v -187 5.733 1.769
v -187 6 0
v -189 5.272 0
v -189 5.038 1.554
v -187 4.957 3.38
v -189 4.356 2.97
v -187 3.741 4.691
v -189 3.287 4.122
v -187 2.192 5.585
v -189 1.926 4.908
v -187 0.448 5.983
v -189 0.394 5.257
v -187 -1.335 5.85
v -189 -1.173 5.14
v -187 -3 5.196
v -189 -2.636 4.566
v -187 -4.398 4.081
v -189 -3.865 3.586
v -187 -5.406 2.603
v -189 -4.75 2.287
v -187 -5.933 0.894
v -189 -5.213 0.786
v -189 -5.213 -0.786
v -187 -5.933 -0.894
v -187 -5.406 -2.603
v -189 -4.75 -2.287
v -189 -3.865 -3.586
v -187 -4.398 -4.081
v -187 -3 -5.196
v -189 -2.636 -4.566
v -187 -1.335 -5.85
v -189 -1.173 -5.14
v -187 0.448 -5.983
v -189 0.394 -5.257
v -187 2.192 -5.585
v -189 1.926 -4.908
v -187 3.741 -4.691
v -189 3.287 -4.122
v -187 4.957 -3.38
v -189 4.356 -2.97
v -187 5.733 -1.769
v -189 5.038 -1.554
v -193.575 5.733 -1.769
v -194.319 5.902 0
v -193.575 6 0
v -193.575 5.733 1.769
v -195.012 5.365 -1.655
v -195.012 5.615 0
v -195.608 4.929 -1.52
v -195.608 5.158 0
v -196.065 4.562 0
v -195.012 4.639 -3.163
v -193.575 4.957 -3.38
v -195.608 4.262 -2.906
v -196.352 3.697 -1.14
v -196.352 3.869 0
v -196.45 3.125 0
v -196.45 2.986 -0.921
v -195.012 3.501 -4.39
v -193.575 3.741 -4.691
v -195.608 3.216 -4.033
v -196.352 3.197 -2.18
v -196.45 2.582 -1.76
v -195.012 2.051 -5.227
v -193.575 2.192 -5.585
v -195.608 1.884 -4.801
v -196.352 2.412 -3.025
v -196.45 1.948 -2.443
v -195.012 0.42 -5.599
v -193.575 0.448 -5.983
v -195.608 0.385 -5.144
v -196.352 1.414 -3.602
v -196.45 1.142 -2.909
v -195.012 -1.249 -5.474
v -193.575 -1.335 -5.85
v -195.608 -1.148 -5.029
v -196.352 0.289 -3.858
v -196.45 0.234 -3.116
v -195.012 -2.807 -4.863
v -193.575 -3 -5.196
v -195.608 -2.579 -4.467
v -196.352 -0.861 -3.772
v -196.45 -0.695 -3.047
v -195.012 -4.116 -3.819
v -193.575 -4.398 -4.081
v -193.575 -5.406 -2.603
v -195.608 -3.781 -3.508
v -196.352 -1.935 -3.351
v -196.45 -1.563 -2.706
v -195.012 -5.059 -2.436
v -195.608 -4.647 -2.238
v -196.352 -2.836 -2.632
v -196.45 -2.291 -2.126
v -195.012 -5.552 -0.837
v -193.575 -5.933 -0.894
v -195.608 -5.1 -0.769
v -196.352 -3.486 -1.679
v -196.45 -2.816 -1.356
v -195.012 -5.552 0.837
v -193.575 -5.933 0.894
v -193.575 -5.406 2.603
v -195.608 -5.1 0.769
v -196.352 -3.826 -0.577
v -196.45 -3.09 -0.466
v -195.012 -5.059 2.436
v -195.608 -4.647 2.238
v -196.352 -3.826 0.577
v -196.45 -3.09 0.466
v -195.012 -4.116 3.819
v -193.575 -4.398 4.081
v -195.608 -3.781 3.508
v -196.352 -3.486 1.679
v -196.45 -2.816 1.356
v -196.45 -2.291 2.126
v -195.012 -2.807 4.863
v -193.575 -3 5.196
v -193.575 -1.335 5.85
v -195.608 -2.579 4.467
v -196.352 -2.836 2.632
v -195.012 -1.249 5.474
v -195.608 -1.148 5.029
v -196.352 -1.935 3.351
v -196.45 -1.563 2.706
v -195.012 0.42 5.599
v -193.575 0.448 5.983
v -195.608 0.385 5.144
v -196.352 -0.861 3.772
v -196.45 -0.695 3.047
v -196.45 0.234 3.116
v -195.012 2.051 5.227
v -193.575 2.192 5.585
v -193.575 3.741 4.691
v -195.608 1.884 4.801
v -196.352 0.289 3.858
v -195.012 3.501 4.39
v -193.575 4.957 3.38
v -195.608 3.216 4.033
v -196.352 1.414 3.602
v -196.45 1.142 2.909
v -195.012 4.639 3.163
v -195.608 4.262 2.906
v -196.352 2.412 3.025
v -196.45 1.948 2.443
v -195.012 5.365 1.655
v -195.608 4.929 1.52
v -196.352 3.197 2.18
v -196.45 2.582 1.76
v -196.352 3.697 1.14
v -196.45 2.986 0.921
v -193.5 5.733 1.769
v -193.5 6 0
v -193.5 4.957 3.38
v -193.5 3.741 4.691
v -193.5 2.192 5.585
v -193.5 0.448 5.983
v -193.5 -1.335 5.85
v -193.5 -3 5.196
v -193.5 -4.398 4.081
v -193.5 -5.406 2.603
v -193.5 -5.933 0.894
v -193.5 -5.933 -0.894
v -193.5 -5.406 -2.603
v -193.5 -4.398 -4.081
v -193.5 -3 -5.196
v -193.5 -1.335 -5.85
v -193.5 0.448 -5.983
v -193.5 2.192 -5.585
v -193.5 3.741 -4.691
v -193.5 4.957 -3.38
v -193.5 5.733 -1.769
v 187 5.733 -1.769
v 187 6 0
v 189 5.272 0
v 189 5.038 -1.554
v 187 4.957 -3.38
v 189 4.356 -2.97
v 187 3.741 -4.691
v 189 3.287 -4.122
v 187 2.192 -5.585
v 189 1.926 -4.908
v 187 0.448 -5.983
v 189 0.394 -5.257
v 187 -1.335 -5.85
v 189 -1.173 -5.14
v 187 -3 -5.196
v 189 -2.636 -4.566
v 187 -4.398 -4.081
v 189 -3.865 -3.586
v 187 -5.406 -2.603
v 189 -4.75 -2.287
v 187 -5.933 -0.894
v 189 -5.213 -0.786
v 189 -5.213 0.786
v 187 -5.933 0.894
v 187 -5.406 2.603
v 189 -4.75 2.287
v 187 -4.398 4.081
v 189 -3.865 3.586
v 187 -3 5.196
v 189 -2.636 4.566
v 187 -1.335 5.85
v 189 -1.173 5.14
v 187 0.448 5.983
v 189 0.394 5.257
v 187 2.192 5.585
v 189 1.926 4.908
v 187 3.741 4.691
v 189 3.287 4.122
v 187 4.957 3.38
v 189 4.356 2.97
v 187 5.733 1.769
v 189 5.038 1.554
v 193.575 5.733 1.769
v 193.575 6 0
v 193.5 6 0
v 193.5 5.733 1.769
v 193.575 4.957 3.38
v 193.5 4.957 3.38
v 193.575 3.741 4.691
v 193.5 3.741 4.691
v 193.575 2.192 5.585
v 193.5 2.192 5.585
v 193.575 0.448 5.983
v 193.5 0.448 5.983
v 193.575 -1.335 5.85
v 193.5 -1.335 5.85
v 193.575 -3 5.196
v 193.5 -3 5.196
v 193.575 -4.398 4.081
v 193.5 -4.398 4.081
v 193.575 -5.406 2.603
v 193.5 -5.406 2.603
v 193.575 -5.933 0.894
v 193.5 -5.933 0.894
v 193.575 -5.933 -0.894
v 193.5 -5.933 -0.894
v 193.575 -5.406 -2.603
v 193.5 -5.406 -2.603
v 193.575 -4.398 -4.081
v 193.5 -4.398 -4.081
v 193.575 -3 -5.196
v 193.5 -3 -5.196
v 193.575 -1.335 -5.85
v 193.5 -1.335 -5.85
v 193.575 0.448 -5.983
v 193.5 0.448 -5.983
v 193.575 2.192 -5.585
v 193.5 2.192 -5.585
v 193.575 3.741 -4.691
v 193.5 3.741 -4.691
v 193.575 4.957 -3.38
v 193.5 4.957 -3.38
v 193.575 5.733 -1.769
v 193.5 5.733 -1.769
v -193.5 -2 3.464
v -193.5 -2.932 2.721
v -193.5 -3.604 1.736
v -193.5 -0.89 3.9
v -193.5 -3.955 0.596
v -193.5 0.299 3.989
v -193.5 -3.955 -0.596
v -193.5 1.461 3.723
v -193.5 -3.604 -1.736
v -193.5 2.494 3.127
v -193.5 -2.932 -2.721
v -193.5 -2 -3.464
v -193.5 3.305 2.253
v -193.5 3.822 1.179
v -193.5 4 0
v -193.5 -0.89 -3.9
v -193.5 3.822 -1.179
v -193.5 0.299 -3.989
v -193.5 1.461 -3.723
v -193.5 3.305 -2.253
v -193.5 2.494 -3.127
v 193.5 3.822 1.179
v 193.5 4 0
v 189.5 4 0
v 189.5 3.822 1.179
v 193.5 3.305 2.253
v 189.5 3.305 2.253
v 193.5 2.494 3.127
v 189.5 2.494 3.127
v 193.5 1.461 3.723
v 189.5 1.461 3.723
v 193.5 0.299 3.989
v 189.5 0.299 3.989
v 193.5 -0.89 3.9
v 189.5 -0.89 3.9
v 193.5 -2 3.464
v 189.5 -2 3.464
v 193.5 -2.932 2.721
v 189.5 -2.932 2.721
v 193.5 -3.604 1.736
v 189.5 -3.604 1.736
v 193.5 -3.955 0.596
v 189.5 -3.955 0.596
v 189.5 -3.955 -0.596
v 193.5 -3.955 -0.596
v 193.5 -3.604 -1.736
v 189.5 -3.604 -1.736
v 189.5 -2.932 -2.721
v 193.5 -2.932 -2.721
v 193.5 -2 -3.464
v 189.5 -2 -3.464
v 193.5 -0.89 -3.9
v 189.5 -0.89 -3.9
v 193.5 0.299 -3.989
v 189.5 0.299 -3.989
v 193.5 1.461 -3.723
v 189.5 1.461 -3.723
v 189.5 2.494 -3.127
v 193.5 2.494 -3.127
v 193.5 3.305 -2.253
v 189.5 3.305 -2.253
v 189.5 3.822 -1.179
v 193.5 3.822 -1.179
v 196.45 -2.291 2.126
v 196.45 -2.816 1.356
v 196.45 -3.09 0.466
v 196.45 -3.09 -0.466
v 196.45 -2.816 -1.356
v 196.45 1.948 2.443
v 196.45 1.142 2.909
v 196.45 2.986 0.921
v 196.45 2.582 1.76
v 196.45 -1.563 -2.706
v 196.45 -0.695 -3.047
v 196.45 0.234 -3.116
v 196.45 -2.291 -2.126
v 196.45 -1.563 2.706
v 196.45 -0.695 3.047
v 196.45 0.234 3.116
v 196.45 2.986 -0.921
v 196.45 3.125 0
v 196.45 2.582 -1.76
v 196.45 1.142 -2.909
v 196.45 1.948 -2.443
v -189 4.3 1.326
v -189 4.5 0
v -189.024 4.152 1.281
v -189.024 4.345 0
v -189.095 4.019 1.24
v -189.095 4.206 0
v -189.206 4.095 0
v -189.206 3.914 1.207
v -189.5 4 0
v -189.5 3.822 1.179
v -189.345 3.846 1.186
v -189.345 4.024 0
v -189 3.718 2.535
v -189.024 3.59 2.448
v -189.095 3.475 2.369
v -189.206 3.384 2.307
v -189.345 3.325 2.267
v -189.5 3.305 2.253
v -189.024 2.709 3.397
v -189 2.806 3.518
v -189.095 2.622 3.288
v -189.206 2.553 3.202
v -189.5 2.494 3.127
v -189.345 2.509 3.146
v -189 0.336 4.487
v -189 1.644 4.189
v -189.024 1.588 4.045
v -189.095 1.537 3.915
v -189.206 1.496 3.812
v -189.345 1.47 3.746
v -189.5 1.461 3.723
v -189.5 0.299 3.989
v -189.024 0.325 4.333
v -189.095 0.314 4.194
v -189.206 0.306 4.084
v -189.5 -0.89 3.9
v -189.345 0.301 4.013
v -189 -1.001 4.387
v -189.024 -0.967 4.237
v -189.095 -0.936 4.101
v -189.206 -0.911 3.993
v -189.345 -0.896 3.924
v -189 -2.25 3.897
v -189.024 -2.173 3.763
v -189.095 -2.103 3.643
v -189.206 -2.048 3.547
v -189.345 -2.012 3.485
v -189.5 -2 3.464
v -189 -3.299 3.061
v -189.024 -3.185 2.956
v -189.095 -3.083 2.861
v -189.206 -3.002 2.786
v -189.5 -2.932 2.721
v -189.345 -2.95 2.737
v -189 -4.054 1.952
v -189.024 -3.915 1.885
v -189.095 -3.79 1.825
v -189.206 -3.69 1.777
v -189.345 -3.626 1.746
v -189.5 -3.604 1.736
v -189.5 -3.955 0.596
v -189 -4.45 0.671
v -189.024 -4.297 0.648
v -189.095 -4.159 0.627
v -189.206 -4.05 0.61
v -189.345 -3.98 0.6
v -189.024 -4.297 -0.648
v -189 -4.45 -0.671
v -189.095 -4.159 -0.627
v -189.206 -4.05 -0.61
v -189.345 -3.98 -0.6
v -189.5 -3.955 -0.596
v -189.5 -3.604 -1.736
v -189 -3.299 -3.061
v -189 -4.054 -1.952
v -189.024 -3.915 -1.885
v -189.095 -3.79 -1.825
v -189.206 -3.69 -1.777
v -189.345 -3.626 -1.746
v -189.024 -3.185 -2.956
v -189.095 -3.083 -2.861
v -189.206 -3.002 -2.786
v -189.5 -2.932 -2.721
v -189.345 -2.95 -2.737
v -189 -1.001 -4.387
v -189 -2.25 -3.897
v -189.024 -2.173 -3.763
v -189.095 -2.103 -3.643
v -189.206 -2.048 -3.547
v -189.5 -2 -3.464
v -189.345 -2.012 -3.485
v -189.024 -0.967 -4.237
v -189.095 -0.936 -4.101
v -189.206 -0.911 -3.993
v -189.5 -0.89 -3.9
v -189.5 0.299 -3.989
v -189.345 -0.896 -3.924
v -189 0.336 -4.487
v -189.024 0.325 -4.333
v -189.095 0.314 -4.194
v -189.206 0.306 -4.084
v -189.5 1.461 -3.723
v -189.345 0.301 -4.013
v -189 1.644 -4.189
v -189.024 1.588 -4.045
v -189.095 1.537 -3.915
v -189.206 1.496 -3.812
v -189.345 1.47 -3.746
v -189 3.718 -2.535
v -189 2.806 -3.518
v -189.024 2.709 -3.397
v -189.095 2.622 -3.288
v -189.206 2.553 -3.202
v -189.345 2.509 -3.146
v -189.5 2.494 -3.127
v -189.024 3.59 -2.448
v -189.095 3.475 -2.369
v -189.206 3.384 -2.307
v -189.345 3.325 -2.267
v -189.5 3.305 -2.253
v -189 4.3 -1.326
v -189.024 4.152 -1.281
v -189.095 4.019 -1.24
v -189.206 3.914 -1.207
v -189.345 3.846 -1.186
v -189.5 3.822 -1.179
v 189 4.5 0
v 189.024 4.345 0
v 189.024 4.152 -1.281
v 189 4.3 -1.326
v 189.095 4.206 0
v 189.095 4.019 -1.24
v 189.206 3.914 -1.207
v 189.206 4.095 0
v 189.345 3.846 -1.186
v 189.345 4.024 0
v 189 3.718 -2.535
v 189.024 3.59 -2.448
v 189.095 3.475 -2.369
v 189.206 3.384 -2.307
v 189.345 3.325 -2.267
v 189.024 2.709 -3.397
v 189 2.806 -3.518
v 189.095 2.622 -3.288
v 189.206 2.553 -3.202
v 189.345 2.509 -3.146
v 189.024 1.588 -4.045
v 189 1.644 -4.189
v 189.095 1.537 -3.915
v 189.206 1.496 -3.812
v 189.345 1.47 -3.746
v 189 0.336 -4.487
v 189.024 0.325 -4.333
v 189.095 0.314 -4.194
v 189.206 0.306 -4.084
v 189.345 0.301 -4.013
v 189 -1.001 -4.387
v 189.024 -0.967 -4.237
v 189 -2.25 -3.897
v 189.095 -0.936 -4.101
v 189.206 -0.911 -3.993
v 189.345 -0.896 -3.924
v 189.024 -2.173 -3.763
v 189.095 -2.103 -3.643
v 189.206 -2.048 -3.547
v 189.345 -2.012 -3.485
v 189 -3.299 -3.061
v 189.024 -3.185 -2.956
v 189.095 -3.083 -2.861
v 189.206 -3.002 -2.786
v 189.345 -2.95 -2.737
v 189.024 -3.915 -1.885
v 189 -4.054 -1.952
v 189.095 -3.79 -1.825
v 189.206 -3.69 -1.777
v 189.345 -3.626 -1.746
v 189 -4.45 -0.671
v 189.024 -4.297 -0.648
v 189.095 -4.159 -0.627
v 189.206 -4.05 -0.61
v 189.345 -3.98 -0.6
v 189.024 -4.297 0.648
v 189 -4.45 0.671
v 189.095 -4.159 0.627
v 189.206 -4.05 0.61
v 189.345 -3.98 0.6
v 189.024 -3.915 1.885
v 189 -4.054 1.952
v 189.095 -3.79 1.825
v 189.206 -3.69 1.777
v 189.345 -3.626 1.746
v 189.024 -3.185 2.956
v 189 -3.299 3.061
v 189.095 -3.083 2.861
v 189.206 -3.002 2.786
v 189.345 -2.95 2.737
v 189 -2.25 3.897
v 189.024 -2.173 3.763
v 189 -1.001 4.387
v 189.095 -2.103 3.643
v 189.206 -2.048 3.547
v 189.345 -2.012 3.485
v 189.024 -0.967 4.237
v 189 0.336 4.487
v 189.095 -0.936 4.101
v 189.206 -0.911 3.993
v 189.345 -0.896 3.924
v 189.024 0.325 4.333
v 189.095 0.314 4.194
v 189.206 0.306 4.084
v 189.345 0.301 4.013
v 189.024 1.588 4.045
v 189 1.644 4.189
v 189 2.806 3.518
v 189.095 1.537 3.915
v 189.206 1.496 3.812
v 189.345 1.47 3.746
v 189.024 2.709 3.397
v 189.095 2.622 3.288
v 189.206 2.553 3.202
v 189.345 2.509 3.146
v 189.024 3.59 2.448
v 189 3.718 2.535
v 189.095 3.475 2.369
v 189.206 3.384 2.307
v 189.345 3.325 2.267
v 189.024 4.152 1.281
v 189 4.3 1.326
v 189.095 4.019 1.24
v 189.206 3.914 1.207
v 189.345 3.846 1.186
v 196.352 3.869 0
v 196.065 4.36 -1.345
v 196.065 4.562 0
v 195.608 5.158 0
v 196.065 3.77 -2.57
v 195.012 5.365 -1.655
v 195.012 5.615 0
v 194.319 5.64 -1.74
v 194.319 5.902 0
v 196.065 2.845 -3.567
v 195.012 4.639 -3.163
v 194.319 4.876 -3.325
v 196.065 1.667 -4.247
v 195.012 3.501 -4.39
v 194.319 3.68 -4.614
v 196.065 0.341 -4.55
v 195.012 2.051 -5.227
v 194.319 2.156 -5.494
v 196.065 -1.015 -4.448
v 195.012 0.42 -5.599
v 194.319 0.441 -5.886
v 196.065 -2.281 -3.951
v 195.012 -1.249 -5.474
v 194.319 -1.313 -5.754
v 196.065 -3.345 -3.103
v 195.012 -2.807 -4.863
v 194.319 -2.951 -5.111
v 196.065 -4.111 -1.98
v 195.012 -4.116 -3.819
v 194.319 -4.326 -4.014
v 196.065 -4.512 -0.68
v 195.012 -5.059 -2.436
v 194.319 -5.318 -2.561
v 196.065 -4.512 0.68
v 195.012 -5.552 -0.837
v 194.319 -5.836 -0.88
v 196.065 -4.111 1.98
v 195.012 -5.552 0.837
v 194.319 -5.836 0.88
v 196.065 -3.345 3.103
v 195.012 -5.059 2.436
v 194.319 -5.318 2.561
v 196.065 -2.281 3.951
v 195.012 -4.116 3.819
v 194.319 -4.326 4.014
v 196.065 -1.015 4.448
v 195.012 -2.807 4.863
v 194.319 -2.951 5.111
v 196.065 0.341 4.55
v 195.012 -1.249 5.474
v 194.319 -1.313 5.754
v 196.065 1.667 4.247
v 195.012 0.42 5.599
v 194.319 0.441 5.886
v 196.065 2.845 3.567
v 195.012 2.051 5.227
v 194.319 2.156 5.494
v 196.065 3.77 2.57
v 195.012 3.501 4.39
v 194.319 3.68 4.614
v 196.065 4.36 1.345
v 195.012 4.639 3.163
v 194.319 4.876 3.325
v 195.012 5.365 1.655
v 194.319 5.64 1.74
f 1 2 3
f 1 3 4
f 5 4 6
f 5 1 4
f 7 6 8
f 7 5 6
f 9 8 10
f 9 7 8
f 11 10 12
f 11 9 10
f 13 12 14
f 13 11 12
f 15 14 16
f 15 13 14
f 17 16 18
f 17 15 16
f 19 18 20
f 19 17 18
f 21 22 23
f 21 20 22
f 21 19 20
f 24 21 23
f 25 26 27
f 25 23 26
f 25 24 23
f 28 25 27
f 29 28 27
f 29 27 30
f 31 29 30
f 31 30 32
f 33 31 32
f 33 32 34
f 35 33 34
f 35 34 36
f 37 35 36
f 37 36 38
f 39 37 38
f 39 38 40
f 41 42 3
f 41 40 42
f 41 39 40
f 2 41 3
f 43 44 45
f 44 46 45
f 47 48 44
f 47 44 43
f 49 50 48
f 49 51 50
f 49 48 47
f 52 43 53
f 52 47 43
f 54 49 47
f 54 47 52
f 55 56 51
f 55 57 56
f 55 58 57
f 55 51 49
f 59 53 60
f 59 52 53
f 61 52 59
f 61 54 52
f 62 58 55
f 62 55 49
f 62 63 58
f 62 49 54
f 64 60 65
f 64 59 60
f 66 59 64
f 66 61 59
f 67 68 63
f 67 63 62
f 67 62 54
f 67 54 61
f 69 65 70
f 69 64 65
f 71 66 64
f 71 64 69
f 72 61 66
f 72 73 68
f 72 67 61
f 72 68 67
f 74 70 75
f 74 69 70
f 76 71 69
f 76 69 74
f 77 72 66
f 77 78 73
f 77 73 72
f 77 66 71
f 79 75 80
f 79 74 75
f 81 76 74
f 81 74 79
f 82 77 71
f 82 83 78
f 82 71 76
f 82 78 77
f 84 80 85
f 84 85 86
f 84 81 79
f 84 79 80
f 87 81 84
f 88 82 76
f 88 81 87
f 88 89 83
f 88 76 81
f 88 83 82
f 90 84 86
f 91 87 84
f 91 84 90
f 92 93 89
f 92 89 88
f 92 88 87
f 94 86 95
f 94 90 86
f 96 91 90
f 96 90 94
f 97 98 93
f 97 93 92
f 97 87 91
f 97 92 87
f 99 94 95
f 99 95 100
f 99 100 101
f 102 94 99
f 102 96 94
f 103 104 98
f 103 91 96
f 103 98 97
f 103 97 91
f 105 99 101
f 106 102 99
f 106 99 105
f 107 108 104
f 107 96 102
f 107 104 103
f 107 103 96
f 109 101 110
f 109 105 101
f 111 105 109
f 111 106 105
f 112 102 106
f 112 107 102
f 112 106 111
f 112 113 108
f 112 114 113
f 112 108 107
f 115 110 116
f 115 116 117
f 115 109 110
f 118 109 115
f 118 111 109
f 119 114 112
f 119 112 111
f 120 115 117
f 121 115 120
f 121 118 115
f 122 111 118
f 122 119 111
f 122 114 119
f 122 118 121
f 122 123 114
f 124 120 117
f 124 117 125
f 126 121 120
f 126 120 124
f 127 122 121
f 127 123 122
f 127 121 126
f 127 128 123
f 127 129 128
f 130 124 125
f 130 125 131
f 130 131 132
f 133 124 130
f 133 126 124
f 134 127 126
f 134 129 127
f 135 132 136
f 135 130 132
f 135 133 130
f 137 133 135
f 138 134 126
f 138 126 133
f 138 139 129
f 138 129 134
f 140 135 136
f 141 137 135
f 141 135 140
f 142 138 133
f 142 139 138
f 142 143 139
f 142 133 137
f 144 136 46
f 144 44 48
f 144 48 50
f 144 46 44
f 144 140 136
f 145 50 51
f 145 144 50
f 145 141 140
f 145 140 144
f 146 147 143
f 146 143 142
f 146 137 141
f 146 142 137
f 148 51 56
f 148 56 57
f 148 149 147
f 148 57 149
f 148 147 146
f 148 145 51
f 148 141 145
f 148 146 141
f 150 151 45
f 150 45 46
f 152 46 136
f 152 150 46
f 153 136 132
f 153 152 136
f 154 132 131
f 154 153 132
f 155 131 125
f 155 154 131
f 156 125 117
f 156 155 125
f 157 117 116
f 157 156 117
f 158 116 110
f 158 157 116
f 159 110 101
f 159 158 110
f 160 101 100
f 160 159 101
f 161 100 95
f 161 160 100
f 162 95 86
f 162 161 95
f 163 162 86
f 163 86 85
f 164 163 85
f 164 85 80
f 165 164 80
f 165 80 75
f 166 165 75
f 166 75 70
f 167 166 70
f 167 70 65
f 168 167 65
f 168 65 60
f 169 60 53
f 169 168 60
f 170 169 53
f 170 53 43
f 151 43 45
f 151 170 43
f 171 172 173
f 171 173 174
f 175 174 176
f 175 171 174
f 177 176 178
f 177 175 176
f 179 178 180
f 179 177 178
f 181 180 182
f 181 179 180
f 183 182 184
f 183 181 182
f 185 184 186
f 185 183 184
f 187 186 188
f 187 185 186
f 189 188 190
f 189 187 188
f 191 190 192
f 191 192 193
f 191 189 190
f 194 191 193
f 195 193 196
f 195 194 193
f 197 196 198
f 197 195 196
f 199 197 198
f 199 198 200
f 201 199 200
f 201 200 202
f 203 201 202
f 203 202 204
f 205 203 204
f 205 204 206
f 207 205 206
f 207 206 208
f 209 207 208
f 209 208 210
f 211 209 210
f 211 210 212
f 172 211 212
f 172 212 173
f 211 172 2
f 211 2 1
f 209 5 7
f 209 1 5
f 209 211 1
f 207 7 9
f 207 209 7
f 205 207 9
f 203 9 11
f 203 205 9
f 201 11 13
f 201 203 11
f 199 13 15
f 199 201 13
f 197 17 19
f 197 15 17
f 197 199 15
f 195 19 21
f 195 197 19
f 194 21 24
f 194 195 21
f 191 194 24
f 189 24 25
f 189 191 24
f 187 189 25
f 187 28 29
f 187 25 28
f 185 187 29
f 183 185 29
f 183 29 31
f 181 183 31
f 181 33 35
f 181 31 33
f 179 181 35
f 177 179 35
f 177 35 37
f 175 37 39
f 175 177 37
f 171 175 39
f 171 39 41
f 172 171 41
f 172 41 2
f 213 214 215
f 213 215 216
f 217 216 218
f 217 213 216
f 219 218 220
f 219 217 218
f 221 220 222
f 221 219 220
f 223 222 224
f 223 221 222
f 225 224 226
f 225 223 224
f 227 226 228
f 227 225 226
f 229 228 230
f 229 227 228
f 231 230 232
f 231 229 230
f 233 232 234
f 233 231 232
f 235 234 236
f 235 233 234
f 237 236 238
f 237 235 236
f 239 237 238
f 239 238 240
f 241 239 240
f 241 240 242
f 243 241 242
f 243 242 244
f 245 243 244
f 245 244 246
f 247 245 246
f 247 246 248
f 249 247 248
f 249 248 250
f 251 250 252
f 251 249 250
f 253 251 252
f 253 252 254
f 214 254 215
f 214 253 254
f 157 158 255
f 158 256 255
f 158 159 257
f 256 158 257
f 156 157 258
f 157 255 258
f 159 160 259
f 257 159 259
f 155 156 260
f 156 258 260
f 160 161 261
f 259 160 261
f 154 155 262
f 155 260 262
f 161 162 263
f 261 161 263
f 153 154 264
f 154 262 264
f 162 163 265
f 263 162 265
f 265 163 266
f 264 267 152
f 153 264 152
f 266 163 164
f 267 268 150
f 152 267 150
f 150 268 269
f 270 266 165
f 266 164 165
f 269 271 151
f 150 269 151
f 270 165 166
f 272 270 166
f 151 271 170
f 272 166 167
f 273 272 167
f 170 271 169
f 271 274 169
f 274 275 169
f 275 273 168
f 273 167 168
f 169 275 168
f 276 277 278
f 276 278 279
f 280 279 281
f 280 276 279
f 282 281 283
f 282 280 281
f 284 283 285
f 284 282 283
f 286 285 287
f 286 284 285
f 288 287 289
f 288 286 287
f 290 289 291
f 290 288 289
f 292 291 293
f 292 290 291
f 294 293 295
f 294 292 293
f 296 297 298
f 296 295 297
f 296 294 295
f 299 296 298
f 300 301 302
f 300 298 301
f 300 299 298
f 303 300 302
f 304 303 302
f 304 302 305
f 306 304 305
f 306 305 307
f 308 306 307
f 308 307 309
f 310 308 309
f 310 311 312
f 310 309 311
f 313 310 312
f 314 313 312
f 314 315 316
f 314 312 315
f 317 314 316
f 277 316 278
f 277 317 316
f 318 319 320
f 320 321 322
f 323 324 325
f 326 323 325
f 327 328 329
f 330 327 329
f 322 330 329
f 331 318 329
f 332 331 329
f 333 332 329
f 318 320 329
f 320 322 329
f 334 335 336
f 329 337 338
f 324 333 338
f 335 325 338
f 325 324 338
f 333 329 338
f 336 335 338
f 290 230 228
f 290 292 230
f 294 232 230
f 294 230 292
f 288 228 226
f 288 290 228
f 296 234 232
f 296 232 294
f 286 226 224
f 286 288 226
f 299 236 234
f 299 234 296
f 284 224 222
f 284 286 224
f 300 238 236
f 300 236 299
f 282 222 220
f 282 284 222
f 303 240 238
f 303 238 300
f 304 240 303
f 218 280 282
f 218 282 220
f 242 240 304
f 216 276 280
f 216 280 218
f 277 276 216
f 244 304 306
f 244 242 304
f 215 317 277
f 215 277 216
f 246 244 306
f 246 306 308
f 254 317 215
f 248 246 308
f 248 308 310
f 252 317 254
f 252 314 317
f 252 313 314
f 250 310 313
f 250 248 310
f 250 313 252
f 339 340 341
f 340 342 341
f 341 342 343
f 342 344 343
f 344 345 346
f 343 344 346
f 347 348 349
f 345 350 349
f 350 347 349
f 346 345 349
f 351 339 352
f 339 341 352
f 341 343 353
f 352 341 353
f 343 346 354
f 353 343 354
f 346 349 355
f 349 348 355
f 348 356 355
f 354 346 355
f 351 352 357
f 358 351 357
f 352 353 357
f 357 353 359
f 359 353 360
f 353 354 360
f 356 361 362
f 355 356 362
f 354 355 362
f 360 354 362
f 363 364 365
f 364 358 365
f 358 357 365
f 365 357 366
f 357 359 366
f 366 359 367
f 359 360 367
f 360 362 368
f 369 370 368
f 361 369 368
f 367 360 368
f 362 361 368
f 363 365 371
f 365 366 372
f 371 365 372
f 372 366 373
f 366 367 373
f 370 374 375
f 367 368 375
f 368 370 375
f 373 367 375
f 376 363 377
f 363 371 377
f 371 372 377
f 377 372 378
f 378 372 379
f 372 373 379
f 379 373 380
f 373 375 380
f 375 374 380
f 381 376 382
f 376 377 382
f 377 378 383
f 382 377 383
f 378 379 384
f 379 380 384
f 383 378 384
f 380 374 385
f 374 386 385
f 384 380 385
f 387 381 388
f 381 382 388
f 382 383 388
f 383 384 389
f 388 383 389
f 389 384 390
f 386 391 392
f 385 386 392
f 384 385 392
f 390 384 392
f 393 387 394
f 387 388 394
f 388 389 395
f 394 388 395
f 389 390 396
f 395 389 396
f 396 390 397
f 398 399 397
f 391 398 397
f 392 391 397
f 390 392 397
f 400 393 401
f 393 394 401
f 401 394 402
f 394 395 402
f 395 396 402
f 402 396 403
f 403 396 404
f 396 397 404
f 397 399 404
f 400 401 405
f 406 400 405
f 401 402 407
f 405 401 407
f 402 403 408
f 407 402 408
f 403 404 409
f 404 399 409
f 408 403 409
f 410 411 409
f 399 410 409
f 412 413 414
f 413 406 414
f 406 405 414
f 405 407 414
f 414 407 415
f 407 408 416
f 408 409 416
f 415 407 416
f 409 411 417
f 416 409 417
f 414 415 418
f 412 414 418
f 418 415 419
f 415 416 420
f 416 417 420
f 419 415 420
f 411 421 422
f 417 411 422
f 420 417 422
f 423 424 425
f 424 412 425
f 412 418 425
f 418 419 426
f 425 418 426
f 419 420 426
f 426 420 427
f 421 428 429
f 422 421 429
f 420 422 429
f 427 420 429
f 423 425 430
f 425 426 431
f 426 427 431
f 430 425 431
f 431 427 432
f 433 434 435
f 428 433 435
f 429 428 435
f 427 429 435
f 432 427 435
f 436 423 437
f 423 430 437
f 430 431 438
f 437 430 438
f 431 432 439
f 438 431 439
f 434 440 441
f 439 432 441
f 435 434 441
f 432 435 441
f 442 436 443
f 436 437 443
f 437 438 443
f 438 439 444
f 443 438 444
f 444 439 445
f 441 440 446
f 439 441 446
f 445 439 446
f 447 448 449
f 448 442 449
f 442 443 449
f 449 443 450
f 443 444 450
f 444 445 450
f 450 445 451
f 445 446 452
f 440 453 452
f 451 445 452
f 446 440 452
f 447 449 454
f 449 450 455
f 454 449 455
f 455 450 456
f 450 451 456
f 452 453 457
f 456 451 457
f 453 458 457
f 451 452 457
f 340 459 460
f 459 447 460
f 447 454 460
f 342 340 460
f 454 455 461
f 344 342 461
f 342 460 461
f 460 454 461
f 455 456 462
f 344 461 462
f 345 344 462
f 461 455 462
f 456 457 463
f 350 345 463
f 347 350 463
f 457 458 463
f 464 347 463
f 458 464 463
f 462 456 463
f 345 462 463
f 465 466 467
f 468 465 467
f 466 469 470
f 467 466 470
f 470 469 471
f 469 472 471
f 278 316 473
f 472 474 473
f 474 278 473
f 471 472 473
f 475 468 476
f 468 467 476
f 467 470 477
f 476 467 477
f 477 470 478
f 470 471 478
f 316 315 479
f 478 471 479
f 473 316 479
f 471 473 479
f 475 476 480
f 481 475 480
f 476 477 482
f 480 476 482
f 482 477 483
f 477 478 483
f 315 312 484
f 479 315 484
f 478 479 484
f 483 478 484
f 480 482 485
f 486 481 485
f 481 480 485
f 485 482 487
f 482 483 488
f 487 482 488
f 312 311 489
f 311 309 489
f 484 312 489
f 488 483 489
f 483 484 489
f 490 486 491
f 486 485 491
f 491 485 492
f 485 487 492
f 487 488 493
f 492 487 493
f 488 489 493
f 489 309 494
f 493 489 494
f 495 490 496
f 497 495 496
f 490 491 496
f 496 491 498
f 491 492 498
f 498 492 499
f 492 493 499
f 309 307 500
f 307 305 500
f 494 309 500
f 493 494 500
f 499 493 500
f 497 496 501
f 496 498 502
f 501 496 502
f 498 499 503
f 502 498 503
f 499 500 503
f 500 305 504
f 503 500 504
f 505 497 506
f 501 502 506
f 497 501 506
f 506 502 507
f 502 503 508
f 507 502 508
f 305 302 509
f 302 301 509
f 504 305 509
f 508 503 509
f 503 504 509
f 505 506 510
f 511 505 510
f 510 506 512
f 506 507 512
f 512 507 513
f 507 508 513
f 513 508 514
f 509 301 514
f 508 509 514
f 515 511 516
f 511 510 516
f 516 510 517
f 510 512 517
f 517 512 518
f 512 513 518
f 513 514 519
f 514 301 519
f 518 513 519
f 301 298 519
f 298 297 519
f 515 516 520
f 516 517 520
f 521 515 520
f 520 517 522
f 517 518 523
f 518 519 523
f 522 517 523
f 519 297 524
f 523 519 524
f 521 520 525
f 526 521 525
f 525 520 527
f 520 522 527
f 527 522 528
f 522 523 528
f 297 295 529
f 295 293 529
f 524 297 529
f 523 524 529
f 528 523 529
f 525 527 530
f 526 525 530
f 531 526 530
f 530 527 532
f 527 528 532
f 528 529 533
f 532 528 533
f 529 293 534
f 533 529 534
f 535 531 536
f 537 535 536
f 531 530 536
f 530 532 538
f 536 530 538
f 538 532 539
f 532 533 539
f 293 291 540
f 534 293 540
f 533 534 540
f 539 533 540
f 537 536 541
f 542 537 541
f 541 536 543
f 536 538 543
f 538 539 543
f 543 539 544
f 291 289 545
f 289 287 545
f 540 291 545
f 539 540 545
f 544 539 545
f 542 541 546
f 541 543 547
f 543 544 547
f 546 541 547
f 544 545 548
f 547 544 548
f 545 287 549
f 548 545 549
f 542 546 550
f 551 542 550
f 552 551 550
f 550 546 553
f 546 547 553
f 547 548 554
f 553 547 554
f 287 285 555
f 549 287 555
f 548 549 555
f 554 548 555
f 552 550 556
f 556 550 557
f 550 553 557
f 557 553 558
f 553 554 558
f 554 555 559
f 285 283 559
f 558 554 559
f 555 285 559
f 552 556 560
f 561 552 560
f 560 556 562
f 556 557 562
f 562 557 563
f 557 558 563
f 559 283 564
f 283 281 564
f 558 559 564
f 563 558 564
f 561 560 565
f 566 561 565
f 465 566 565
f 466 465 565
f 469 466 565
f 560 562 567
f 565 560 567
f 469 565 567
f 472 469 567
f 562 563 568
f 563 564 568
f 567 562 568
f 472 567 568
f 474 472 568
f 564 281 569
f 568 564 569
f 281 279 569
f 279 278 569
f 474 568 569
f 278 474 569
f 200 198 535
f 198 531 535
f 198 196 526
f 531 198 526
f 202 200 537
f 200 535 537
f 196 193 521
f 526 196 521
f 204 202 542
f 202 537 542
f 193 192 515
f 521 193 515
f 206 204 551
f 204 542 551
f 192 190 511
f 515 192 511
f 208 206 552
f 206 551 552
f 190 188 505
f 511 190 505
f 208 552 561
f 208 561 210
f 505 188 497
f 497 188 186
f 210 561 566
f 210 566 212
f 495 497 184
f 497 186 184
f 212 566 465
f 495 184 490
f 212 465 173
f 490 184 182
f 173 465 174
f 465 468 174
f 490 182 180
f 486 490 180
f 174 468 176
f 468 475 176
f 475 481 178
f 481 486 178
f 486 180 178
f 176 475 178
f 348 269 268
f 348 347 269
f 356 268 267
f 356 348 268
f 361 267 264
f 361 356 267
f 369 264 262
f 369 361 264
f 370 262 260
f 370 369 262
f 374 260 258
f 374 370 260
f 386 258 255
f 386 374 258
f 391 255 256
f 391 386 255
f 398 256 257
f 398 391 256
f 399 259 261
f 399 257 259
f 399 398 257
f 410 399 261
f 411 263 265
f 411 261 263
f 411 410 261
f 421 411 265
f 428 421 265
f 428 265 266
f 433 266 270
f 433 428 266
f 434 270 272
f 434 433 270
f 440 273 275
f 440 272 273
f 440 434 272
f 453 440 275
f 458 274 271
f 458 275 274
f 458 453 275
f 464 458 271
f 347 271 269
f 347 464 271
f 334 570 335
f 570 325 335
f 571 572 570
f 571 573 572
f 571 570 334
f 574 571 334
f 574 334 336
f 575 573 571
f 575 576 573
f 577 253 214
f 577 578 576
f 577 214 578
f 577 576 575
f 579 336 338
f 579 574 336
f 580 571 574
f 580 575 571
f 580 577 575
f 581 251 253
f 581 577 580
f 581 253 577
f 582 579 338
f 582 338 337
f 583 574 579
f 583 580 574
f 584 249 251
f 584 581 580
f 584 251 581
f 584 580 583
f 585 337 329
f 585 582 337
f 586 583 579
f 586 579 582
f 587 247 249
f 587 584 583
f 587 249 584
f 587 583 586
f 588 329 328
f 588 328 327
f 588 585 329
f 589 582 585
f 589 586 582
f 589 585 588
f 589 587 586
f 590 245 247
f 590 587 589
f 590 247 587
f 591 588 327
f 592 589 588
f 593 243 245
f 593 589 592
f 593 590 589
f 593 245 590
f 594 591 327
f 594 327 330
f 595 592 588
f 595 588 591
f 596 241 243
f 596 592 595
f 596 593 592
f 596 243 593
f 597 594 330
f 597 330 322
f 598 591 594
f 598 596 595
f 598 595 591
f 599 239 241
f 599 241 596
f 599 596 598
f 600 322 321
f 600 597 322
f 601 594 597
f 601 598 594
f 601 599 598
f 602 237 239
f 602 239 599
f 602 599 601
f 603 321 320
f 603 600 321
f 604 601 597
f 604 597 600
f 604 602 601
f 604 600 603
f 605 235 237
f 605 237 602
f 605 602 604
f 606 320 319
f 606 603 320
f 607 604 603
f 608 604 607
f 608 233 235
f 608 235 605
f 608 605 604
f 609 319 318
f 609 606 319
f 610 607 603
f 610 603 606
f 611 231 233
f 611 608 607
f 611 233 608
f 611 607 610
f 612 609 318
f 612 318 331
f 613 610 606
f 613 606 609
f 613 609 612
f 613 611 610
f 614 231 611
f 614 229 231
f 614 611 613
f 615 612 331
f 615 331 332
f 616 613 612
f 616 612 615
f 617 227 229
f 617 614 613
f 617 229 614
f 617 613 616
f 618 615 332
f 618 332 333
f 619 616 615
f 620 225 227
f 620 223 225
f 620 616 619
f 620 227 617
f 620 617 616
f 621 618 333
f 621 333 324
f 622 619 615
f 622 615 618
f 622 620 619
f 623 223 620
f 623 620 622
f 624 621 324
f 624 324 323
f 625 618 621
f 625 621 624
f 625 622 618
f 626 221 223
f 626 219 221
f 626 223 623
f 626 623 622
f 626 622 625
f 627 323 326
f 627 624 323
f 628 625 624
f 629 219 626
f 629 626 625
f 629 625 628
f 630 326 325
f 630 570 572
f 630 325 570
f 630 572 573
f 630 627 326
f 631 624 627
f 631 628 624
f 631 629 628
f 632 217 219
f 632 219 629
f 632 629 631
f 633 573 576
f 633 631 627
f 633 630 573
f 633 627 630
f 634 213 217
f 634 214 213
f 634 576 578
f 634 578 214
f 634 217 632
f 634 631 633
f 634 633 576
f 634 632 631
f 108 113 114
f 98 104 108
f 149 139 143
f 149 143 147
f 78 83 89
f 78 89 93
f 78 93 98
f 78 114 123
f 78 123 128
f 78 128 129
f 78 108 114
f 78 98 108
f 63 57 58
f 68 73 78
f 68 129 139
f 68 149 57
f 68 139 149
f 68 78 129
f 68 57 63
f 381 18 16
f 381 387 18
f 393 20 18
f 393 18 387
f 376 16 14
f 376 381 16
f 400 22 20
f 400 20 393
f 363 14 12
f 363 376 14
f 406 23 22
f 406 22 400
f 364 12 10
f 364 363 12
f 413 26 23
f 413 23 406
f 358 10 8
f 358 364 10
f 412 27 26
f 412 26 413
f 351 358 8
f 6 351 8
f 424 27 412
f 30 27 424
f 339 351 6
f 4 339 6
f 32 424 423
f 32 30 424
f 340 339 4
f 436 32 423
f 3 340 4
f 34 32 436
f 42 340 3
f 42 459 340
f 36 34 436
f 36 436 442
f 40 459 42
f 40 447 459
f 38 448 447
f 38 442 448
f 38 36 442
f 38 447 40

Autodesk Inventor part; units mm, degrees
ref_plane "YZ Plane" through (0, 0, 0) normal (1, 0, 0) x (0, 1, 0)
ref_plane "XZ Plane" through (0, 0, 0) normal (0, 1, 0) x (-1, 0, 0)
sketch "Sketch1" plane through (0, 0, 0) normal (0, 0, 1) x (1, 0, 0)
  line L0 (196.45, 0) -> (-196.45, 0)
  line L1 (-196.45, 0) -> (-196.45, 3.125)
  line L2 (-193.575, 6) -> (-193.5, 6)
  line L3 (-193.5, 6) -> (-193.5, 4)
  line L4 (-193.5, 4) -> (-189, 4)
  line L5 (-189, 4) -> (-189, 6)
  line L6 (-189, 6) -> (189, 6)
  line L7 (189, 6) -> (189, 4)
  line L8 (189, 4) -> (193.5, 4)
  line L9 (193.5, 4) -> (193.5, 6)
  line L10 (193.5, 6) -> (193.575, 6)
  line L11 (196.45, 3.125) -> (196.45, 0)
  arc A0 (-193.575, 6) -> (-196.45, 3.125) centre (-193.575, 3.125) ccw
  arc A1 (196.45, 3.125) -> (193.575, 6) centre (193.575, 3.125) ccw
  point P0 (0, 0)
  point P1 (0, 0)
  dimension "d2" = 12
  dimension "d4" = 8
  dimension "d5" = 12
  dimension "d7" = 8
  dimension "d8" = 12
  dimension "d15" = 2.875
  dimension "d21" = 2.95
  dimension "d22" = 4.5
  dimension "d23" = 2.95
  dimension "d24" = 4.5
  dimension "d29" = 387
revolve "Revolution1" add sketch "Sketch1" angle 360 about axis through (196.45, 0, 0) along (-1, 0, 0)
chamfer "Chamfer1" distance 2 angle 20 1 edges at (-189, -6, 0) measured on face at (-63, 5.9223, 0.9625)
fillet "Fillet1" radius 0.5 2 edges at (189, -4, 0) (-189, -4, 0)
chamfer "Chamfer2" distance 2 angle 20 1 edges at (189, -6, 0) measured on face at (-61.6667, 5.9805, 0.4828)
ref_plane "Work Plane1" through (-81.95, 0, 0) normal (-1, 0, 0) x (0, 0, 1)
split_face "Split1"
equation "\"d2\" = d5"
equation "\"d7\" = d4"
equation "\"d8\" = d5"
equation "\"d24\" = d22"
properties part number "311-03" material "Steel"
